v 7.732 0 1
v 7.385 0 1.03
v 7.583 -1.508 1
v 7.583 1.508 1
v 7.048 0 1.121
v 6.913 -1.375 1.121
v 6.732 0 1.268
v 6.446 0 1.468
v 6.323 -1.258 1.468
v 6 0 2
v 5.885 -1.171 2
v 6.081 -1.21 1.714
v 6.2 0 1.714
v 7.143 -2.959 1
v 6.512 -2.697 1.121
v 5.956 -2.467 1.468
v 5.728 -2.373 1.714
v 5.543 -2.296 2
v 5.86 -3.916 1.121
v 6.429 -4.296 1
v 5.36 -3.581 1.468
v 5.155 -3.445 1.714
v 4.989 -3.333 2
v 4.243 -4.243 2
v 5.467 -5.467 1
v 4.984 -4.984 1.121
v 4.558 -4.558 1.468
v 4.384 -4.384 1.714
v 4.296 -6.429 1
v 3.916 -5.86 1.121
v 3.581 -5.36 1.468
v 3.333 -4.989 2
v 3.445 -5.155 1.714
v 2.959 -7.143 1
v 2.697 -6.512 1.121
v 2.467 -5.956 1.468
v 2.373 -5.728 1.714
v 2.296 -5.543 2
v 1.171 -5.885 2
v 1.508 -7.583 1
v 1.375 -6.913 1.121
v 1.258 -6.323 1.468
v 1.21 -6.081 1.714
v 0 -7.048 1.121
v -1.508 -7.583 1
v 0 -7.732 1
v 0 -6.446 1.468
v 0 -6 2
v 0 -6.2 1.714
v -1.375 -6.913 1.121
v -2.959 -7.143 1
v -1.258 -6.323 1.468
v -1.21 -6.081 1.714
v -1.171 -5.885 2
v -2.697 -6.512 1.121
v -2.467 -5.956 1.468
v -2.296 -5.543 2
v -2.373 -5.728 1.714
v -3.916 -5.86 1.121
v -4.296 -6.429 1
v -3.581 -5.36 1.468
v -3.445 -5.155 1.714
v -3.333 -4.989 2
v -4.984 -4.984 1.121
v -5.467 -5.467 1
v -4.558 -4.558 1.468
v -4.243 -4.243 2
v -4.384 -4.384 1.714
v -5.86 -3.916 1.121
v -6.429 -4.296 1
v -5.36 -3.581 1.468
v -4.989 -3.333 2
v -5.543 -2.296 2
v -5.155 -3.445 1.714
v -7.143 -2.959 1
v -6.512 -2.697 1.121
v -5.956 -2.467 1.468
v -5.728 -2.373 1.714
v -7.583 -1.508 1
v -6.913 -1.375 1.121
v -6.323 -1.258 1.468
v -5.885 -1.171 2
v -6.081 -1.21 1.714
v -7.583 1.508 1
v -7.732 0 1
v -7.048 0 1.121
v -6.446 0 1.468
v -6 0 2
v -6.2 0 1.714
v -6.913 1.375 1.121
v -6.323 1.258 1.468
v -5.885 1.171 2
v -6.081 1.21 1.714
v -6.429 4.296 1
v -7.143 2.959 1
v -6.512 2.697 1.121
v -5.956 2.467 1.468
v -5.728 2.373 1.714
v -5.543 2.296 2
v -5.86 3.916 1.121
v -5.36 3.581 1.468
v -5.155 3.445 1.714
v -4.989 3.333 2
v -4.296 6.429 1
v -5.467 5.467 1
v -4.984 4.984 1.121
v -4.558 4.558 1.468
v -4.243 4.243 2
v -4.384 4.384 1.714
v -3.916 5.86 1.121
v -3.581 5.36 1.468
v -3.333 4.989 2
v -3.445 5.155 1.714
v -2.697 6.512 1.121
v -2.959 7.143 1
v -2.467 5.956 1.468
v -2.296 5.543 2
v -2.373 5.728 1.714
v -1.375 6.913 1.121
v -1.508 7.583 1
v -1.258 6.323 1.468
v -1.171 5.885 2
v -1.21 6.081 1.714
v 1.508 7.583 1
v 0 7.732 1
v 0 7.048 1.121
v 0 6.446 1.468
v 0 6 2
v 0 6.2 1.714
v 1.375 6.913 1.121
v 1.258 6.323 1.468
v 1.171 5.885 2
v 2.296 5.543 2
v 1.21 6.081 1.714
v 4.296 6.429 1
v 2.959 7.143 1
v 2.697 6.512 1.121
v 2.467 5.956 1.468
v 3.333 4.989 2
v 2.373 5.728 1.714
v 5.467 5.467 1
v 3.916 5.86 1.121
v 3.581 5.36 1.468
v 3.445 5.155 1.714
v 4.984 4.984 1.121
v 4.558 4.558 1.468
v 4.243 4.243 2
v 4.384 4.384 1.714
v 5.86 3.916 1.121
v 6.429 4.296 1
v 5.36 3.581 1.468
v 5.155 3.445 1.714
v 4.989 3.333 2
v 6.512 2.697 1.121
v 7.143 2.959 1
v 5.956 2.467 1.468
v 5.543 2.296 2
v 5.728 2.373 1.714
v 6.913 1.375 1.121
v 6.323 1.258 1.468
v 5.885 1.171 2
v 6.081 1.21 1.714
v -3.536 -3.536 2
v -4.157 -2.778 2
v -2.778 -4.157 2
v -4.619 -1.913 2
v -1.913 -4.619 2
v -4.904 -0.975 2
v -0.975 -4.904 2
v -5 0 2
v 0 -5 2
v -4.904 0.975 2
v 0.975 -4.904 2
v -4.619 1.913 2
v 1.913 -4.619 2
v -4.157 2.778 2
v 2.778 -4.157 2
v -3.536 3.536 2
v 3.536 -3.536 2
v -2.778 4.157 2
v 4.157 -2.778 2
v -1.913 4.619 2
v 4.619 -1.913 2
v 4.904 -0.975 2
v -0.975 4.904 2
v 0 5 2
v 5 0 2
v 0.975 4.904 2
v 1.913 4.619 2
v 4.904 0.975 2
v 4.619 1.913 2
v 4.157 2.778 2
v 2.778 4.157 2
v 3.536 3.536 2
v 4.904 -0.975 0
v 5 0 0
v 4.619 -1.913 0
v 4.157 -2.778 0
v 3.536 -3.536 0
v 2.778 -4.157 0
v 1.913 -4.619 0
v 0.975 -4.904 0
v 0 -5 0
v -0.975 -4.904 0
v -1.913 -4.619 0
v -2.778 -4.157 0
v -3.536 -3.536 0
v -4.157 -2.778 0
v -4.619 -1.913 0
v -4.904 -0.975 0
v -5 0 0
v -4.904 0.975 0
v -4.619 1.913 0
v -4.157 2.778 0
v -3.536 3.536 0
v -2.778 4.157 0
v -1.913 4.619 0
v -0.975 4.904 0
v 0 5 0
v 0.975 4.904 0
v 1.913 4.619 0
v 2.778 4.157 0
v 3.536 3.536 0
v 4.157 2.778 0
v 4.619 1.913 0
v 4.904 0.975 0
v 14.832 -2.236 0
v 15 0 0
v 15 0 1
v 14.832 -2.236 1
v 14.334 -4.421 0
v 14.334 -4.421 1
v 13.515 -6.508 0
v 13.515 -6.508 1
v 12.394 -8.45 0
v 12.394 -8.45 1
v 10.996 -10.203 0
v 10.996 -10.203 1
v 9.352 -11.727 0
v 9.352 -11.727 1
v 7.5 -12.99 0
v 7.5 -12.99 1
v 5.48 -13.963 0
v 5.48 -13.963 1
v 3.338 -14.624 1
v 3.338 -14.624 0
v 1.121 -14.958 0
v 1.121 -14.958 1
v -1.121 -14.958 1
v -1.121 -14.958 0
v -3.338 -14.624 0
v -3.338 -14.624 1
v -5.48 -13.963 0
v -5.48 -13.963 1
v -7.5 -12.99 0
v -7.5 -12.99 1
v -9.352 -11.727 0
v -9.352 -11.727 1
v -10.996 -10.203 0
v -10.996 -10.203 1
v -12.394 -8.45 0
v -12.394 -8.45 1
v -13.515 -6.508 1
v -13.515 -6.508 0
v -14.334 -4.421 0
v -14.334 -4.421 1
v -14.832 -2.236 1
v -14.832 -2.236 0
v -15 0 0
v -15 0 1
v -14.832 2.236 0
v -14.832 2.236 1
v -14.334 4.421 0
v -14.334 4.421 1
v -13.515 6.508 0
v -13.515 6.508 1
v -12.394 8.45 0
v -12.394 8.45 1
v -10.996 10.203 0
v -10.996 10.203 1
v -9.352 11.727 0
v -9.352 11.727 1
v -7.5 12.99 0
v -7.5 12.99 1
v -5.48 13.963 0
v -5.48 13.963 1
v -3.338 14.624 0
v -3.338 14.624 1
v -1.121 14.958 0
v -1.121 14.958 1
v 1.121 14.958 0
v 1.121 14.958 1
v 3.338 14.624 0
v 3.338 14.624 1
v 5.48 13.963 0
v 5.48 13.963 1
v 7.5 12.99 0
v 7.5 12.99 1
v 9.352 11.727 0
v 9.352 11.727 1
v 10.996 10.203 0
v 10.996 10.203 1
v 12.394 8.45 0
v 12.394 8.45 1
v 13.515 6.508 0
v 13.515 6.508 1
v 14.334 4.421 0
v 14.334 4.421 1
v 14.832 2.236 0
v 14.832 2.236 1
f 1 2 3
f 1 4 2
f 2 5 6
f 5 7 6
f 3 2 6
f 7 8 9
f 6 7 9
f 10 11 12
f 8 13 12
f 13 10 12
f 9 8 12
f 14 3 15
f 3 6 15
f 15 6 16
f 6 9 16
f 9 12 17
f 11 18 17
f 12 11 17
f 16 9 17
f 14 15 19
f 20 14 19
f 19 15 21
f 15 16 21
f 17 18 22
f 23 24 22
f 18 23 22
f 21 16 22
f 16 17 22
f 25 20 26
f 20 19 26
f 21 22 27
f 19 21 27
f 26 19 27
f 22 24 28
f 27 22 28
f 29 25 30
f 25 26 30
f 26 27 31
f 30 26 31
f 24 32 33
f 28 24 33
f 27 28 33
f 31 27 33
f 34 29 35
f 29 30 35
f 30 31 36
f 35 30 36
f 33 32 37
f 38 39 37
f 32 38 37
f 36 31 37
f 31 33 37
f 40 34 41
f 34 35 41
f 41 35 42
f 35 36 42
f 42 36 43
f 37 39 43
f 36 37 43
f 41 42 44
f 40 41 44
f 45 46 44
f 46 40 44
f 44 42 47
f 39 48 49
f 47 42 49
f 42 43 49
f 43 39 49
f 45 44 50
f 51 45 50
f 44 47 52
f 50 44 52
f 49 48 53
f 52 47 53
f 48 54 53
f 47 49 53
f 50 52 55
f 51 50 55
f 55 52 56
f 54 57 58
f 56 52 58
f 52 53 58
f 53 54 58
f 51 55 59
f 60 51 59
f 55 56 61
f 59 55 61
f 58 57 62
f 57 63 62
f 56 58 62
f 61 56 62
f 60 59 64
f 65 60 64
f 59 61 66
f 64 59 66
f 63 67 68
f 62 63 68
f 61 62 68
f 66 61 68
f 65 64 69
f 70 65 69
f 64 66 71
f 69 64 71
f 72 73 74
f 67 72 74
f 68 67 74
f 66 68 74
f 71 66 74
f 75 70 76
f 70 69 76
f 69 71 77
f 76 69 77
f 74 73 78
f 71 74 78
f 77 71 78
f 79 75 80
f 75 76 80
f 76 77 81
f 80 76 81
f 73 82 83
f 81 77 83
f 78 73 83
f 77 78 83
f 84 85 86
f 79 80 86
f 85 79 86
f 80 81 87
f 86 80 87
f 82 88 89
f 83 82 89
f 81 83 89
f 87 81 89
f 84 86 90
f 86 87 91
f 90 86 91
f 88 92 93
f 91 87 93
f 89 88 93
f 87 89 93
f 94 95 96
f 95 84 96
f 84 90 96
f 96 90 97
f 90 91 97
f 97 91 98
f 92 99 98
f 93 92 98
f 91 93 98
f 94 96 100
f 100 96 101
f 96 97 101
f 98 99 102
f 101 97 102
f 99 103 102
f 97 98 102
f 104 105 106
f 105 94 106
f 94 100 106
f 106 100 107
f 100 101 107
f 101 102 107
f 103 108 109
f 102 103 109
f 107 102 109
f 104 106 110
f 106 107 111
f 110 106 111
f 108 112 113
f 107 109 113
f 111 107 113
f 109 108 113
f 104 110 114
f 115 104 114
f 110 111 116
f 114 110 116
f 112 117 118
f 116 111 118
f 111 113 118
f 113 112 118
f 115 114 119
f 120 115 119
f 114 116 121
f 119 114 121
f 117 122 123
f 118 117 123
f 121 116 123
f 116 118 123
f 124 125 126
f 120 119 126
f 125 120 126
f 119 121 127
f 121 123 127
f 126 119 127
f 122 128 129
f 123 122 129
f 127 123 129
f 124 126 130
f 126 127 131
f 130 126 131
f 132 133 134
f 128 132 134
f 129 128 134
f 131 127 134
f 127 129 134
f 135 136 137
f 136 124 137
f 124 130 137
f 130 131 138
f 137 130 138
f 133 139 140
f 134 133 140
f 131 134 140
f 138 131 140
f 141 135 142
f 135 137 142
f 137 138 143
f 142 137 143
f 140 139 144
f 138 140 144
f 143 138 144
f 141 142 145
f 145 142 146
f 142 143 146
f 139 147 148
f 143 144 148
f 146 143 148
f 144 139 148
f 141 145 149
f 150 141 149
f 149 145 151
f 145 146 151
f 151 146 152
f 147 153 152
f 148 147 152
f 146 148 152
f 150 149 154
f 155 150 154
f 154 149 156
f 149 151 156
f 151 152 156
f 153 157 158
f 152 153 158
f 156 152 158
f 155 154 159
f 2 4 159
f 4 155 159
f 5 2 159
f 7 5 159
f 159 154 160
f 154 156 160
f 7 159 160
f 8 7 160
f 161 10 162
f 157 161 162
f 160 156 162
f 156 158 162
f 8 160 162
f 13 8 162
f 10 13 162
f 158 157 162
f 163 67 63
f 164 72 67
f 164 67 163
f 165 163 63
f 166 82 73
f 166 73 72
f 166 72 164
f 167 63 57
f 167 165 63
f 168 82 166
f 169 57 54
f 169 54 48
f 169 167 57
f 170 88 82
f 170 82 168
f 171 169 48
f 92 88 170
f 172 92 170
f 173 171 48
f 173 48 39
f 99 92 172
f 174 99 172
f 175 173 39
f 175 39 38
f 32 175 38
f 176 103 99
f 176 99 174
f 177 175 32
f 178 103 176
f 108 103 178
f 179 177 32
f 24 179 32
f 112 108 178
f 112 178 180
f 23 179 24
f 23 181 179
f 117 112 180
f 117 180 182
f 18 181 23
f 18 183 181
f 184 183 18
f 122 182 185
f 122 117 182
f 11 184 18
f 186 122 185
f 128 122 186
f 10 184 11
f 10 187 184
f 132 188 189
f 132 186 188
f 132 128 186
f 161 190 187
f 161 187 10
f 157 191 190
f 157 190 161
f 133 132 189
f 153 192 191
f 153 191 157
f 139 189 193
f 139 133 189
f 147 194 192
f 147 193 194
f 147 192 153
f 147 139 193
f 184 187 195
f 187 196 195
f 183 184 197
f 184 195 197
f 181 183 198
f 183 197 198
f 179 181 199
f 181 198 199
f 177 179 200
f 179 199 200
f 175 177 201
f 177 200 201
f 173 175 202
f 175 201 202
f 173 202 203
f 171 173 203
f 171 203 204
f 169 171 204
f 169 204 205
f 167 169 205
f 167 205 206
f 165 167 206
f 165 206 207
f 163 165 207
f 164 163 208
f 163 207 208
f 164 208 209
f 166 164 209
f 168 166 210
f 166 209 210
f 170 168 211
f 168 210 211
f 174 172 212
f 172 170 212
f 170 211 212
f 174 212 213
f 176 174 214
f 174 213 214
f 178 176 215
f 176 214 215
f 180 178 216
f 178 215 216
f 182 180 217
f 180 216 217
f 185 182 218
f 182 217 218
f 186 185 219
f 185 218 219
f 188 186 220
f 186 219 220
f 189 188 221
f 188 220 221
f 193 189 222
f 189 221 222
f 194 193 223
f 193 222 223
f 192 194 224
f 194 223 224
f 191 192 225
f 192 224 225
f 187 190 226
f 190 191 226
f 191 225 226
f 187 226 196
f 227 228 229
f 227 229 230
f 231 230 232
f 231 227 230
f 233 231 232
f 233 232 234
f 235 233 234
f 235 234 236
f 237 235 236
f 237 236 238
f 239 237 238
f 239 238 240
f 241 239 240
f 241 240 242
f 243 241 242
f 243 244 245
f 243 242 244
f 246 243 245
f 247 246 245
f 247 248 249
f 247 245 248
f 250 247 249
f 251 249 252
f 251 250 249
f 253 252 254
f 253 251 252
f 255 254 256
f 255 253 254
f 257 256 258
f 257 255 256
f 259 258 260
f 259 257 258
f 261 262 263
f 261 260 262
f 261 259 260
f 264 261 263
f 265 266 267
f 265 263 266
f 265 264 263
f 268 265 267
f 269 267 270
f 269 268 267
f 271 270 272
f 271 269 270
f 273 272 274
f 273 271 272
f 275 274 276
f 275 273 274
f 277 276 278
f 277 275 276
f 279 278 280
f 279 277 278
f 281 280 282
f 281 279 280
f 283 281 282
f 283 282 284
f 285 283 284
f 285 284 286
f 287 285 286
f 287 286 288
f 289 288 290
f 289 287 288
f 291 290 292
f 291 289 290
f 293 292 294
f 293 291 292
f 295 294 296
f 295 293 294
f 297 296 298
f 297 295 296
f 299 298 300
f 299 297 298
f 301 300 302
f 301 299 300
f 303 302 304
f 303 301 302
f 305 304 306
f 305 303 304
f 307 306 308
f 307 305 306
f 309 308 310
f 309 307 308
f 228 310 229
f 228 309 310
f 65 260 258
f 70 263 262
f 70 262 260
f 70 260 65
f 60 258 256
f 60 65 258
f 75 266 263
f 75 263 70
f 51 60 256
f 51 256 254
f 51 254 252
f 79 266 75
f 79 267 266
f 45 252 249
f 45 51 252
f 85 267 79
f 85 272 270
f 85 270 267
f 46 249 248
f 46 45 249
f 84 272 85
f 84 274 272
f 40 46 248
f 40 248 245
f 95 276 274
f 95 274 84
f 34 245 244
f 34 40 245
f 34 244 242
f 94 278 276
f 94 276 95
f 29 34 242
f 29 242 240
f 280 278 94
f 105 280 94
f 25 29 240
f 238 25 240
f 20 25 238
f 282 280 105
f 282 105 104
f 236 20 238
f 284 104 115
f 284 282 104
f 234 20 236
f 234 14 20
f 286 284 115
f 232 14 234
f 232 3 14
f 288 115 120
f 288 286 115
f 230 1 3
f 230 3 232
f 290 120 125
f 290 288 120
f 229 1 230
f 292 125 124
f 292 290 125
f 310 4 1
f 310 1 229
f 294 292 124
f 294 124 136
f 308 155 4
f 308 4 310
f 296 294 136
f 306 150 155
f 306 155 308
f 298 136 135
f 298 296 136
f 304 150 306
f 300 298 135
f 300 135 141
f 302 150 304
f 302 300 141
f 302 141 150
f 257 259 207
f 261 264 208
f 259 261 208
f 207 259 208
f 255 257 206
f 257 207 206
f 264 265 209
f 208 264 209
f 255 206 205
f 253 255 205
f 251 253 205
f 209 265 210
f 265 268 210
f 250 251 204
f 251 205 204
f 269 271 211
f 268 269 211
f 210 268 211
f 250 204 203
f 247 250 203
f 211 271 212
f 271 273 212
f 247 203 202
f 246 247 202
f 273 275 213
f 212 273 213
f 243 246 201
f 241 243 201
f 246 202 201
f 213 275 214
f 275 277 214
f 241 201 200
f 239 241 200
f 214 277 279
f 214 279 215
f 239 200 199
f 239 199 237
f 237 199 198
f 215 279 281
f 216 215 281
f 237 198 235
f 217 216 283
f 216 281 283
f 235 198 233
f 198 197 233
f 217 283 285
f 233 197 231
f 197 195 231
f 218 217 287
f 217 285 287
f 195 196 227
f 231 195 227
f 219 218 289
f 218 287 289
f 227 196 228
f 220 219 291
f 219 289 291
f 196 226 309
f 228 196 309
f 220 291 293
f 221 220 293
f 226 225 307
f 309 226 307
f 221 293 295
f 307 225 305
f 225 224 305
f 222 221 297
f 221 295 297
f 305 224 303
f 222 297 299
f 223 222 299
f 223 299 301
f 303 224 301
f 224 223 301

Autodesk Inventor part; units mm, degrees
ref_plane "YZ Plane" through (0, 0, 0) normal (1, 0, 0) x (0, 1, 0)
ref_plane "XZ Plane" through (0, 0, 0) normal (0, 1, 0) x (-1, 0, 0)
ref_plane "XY Plane" through (0, 0, 0) normal (0, 0, 1) x (1, 0, 0)
sketch "Sketch1" plane through (0, 0, 0) normal (0, 0, 1) x (1, 0, 0)
  circle A0 centre (0, 0) radius 5
  circle A1 centre (0, 0) radius 15
  circle A2 centre (0, 0) radius 6
  dimension "d0" = 10
  dimension "d1" = 30
  dimension "d2" = 1
extrude "Extrusion1" add sketch "Sketch1" along normal blind 1 contours A1
extrude "Extrusion2" add sketch "Sketch1" along normal blind 2 contours A2
fillet "Fillet1" radius 2 1 edges at (-6, 0, 1)
properties part number "Retenedor"
